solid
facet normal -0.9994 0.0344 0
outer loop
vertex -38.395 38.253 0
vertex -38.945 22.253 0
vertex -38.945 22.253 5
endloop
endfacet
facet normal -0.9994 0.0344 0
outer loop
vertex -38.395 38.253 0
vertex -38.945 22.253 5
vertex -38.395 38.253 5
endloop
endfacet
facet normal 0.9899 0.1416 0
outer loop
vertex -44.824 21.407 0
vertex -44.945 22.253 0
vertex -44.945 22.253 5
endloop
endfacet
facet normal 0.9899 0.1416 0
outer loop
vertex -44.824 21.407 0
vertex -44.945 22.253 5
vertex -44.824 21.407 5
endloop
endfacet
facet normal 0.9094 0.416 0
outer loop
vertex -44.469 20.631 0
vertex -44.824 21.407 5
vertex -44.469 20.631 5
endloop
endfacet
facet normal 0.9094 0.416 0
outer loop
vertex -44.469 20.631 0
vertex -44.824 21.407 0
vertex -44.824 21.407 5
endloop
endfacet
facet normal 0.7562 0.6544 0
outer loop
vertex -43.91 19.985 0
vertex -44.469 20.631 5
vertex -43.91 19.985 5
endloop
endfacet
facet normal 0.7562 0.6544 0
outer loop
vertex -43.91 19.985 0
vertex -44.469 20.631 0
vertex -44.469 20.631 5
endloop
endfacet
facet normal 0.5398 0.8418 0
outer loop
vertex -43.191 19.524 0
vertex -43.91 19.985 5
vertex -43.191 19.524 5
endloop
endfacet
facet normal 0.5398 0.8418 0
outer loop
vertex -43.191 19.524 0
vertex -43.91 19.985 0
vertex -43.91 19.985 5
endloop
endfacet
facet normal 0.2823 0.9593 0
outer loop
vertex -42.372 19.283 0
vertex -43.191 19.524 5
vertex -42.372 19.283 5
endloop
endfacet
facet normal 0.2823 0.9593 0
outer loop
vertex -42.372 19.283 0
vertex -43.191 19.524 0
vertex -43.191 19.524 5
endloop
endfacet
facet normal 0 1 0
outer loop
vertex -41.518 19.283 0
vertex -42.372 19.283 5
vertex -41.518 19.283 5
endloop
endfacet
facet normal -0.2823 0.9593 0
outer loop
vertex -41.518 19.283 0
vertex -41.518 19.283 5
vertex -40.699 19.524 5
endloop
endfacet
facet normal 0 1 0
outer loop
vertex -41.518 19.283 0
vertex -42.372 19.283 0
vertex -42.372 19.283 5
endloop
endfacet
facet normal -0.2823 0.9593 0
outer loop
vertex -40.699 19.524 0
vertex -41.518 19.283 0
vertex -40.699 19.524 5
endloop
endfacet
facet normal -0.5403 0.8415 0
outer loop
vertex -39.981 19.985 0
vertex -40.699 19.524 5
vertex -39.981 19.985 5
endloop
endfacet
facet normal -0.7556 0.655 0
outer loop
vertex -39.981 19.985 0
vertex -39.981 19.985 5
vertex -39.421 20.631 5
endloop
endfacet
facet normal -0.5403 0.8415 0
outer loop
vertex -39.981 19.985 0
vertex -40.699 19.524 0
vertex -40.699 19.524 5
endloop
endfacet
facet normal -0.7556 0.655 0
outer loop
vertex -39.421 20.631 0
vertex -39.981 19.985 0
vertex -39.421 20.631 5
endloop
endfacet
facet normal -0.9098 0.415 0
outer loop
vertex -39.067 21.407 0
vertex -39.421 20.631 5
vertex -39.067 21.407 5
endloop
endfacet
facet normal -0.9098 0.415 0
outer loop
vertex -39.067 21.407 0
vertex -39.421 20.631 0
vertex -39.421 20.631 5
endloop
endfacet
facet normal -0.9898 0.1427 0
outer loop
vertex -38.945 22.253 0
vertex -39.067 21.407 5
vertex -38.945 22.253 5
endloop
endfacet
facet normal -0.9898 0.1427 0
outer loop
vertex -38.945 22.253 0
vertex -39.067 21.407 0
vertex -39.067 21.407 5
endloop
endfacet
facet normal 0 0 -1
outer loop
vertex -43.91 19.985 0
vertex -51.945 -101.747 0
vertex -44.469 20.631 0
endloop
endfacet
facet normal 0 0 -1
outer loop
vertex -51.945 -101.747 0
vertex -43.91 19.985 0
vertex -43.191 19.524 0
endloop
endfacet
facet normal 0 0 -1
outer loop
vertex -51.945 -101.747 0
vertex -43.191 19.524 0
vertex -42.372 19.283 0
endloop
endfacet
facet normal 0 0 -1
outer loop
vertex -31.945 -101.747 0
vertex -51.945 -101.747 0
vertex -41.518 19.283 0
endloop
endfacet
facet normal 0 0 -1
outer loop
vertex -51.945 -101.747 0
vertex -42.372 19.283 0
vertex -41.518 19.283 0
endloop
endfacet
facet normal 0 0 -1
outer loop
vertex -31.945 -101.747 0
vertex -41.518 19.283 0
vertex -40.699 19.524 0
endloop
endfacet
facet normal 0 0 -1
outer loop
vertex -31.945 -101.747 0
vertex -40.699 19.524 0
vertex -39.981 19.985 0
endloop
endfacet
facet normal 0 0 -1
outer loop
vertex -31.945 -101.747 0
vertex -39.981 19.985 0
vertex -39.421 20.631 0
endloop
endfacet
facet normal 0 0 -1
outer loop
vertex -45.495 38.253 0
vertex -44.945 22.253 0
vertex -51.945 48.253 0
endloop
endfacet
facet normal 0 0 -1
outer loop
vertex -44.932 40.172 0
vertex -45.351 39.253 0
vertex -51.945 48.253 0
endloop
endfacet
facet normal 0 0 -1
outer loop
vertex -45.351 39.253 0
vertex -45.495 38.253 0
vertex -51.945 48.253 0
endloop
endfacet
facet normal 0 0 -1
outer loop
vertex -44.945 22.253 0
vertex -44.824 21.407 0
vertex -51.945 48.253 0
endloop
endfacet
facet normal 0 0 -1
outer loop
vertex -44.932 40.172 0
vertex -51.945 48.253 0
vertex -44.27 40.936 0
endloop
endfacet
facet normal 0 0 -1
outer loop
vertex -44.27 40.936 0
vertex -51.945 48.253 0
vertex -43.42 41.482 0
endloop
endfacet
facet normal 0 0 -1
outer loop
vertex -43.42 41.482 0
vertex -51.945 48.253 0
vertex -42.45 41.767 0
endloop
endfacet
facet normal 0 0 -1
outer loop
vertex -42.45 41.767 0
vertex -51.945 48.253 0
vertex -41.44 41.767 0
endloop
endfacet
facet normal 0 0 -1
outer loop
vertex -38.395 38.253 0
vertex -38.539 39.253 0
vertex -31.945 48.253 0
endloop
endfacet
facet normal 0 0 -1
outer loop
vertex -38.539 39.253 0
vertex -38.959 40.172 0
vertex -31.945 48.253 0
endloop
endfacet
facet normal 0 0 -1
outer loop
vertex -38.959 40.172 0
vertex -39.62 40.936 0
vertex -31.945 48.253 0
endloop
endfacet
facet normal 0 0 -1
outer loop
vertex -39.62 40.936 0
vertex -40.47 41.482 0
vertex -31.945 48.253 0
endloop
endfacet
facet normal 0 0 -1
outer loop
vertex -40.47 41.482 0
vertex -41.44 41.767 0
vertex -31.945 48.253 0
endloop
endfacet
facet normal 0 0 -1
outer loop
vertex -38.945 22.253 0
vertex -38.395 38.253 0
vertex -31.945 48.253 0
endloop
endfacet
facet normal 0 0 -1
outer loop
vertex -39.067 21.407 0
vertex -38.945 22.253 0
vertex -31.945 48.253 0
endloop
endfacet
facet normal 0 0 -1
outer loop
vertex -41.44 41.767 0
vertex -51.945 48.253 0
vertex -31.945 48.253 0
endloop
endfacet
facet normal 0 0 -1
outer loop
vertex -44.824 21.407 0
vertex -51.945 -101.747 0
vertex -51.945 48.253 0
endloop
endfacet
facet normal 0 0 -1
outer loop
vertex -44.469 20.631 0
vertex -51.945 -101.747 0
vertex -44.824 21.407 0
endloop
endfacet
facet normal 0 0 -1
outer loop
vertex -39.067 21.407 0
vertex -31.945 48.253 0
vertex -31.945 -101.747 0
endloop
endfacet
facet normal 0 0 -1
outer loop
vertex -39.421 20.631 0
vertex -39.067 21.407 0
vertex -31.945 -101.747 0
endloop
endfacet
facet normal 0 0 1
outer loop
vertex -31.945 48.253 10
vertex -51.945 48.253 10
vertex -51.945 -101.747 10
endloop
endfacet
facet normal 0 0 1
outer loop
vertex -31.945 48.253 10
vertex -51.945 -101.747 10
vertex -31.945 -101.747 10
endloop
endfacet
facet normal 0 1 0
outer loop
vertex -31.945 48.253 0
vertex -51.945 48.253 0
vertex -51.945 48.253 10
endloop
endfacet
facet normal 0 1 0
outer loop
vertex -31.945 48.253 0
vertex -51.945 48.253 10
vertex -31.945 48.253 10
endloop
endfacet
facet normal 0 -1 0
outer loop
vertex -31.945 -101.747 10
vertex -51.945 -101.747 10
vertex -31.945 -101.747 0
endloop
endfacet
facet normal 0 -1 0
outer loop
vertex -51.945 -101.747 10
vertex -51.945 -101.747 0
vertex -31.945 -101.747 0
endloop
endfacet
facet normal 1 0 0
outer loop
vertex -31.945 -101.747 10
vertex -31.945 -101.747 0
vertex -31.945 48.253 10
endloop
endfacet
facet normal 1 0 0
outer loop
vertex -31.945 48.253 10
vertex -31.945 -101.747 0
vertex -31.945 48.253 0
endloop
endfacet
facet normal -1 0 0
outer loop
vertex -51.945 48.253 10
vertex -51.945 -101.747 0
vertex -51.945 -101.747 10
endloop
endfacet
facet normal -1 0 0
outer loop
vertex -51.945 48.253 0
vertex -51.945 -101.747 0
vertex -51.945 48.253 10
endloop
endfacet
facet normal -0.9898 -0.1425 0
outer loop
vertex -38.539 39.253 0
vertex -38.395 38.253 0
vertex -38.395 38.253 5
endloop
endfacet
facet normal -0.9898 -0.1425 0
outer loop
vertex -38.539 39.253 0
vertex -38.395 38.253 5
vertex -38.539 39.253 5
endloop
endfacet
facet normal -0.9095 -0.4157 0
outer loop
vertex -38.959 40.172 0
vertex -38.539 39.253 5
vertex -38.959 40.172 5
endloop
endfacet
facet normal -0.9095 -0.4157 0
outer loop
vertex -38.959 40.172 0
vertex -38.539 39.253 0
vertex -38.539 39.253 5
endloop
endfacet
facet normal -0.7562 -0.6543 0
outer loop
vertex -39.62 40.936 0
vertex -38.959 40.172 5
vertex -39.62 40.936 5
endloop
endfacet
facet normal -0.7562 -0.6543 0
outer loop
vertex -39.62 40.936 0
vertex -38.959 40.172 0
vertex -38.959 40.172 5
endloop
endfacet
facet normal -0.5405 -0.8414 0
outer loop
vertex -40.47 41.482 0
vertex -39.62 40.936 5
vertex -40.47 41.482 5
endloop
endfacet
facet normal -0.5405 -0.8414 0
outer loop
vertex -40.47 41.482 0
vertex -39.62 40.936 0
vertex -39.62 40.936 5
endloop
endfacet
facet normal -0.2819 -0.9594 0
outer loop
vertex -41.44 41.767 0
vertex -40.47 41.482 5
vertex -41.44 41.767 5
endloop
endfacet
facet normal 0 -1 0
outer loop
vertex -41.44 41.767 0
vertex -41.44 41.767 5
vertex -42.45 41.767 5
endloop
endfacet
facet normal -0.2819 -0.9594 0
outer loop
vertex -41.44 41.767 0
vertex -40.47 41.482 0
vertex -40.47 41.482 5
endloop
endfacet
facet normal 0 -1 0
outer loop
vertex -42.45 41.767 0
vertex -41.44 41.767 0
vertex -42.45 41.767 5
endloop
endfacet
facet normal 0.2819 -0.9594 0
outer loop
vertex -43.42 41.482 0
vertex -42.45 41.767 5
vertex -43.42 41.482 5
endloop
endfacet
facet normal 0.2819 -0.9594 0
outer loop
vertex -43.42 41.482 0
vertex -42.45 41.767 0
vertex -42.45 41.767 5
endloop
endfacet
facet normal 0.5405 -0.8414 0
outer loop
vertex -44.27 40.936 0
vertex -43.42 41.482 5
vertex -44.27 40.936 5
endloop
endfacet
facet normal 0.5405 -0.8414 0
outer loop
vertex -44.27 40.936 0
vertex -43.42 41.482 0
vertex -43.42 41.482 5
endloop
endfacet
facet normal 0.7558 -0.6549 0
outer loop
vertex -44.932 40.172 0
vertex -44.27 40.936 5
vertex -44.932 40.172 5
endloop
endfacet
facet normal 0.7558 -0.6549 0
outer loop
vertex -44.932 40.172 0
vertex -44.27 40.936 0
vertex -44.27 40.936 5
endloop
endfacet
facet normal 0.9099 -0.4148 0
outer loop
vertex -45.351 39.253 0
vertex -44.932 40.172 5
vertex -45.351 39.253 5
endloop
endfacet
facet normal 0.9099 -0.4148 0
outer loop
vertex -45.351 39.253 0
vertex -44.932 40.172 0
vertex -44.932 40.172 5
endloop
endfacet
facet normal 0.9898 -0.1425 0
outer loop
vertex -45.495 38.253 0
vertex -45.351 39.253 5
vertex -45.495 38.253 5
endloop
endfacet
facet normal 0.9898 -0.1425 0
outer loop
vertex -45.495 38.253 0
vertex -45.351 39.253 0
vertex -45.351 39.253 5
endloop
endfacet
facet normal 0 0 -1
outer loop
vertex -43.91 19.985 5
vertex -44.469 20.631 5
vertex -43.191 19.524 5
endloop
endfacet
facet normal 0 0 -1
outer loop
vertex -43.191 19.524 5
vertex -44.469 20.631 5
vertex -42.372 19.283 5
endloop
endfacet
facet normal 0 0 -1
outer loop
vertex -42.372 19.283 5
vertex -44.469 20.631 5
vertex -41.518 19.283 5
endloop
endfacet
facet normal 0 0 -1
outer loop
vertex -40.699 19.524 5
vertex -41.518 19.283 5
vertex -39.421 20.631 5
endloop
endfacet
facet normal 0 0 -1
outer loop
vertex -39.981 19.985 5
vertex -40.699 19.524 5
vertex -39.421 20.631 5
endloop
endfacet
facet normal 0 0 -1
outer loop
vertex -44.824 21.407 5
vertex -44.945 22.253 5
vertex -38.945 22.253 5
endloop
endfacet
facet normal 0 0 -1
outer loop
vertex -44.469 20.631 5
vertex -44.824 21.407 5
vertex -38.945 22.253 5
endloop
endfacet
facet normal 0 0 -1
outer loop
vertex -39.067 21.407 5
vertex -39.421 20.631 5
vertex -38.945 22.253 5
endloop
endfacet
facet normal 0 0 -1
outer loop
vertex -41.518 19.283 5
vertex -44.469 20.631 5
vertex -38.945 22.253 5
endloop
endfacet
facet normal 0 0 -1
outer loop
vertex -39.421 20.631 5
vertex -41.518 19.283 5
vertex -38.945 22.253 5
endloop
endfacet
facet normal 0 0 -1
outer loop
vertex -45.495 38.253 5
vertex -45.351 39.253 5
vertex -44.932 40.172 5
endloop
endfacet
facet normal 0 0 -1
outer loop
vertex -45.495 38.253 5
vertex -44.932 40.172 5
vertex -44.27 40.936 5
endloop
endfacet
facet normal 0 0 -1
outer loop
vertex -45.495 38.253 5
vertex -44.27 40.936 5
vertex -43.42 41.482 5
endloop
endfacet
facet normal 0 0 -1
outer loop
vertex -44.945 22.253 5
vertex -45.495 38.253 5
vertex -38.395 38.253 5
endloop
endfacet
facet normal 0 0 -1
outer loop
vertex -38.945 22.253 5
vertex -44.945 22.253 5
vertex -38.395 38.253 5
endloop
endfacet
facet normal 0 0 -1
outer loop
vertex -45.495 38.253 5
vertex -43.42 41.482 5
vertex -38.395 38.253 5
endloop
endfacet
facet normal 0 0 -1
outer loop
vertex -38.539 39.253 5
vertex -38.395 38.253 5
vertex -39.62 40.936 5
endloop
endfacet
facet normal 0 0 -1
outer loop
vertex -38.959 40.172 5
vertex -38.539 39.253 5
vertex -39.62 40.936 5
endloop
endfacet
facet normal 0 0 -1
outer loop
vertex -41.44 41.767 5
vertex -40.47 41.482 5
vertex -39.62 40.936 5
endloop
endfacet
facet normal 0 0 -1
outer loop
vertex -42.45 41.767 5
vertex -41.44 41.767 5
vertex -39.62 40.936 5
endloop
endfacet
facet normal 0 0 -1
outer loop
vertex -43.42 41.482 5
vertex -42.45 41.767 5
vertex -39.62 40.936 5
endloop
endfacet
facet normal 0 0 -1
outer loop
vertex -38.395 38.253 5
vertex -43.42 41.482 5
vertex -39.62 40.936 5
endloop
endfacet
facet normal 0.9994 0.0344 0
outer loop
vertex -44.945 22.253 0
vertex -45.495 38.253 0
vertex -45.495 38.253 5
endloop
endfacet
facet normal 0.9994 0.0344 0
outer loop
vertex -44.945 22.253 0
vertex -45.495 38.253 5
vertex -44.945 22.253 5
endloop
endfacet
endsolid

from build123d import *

# Parameters (mm, degrees)
ESQUISSE1_W        = 20
ESQUISSE1_H        = 150
BOSS_EXTRU_1_DEPTH = 5
ESQUISSE2_W        = 20
ESQUISSE2_H        = 150
BOSS_EXTRU_2_DEPTH = 5


with BuildPart() as part:
    # Esquisse1 → Boss.-Extru.1 (new body)
    with BuildSketch(Plane.XY):
        with Locations((-41.945195284, -26.747319263)):
            Rectangle(ESQUISSE1_W, ESQUISSE1_H)
        with BuildLine():
            Line((-45.495195284, 38.252680737), (-44.945195284, 22.252680737))
            ThreePointArc((-44.945195284, 22.252680737), (-41.945195284, 19.252680737), (-38.945195284, 22.252680737))
            Line((-38.945195284, 22.252680737), (-38.395195284, 38.252680737))
            ThreePointArc((-38.395195284, 38.252680737), (-41.945195284, 41.802680737), (-45.495195284, 38.252680737))
        make_face(mode=Mode.SUBTRACT)
    extrude(amount=BOSS_EXTRU_1_DEPTH)

    # Esquisse2 → Boss.-Extru.2 (add)
    with BuildSketch(Plane.XY.offset(5)):
        with Locations((-41.945195284, -26.747319263)):
            Rectangle(ESQUISSE2_W, ESQUISSE2_H)
    extrude(amount=BOSS_EXTRU_2_DEPTH)


solid = part.part
